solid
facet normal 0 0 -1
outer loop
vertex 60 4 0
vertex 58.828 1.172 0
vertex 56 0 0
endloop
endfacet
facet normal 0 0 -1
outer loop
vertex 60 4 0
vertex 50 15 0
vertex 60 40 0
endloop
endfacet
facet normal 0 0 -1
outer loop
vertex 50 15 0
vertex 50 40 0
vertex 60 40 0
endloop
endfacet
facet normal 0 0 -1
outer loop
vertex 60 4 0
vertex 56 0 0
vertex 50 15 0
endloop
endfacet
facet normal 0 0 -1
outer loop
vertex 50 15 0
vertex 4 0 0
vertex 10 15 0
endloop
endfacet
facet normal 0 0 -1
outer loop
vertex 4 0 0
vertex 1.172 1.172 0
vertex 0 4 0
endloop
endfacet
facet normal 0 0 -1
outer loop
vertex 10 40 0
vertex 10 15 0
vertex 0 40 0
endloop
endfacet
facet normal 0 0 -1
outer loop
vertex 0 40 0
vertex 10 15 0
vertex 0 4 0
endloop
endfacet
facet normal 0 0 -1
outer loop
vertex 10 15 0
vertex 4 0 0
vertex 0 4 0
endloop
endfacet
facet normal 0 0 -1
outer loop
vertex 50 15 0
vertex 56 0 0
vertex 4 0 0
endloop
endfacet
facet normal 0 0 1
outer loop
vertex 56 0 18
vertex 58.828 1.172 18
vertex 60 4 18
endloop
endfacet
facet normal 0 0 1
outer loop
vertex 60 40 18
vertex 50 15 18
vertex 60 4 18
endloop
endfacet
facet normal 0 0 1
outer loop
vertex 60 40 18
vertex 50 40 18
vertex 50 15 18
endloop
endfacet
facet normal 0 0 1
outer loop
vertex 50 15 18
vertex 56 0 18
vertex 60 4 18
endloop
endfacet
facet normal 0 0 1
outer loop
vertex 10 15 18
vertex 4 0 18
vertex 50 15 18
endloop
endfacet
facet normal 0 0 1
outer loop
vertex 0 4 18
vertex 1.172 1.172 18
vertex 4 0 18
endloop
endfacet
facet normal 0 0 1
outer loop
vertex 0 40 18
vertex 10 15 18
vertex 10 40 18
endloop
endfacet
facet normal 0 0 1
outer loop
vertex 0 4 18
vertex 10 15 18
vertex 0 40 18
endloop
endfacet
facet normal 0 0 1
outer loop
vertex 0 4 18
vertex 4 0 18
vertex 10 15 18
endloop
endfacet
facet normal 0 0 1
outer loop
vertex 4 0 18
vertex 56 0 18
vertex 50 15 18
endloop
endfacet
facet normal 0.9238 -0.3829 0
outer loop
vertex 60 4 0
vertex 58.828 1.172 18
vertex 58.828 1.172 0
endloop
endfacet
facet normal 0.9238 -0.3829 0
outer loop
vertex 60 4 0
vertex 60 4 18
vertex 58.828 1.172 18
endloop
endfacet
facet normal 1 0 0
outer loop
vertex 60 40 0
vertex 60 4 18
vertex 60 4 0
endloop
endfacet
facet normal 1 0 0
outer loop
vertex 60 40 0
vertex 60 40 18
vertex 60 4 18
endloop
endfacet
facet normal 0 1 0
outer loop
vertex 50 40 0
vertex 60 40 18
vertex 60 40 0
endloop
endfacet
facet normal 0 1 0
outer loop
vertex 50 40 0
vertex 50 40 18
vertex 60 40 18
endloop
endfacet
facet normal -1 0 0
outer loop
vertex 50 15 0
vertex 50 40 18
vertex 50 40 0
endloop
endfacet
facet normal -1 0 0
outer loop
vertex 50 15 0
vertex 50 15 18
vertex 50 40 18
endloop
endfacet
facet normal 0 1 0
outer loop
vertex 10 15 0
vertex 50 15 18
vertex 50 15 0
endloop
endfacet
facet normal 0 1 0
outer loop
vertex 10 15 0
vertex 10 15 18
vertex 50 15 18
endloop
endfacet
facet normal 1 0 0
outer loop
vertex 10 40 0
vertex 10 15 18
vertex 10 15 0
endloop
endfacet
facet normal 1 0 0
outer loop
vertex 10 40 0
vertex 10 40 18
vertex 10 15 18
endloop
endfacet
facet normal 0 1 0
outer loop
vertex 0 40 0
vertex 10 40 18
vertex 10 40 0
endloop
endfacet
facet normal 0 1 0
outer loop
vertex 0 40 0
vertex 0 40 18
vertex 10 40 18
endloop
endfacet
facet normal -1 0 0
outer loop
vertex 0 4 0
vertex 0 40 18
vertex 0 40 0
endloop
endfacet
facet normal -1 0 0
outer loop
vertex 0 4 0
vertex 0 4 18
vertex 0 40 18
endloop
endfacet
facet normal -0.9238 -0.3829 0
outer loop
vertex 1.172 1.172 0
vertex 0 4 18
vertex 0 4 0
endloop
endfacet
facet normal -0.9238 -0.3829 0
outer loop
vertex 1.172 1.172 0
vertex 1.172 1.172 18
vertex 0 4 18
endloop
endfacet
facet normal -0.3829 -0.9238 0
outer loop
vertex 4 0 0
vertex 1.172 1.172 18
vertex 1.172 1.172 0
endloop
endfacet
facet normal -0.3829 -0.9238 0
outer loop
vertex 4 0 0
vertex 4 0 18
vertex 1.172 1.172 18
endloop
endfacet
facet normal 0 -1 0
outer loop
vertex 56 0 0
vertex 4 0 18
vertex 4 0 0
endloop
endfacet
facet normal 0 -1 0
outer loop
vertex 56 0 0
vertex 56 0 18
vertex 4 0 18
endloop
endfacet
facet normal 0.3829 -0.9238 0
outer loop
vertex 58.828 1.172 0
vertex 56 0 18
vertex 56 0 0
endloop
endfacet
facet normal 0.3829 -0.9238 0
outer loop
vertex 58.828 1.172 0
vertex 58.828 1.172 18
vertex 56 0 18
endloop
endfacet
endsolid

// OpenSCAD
$fn = 32;

// ----------------------------------------------------------------------
// Heat sink frame: 60 x 40 mm frame, 10 mm walls
// ----------------------------------------------------------------------

// --- parameters (mm) ---
profile_height = 18;      // extrusion height
profile_points = 12;      // points of the closed outline

profile = [[0, 4], [1.172, 1.172], [4, 0], [56, 0], [58.828, 1.172], [60, 4], [60, 40], [50, 40], [50, 15], [10, 15], [10, 40], [0, 40]];  // single closed polygon, 12 points, counter clockwise

// --- the one profile operation ---
linear_extrude(height = profile_height) polygon(points = profile);
